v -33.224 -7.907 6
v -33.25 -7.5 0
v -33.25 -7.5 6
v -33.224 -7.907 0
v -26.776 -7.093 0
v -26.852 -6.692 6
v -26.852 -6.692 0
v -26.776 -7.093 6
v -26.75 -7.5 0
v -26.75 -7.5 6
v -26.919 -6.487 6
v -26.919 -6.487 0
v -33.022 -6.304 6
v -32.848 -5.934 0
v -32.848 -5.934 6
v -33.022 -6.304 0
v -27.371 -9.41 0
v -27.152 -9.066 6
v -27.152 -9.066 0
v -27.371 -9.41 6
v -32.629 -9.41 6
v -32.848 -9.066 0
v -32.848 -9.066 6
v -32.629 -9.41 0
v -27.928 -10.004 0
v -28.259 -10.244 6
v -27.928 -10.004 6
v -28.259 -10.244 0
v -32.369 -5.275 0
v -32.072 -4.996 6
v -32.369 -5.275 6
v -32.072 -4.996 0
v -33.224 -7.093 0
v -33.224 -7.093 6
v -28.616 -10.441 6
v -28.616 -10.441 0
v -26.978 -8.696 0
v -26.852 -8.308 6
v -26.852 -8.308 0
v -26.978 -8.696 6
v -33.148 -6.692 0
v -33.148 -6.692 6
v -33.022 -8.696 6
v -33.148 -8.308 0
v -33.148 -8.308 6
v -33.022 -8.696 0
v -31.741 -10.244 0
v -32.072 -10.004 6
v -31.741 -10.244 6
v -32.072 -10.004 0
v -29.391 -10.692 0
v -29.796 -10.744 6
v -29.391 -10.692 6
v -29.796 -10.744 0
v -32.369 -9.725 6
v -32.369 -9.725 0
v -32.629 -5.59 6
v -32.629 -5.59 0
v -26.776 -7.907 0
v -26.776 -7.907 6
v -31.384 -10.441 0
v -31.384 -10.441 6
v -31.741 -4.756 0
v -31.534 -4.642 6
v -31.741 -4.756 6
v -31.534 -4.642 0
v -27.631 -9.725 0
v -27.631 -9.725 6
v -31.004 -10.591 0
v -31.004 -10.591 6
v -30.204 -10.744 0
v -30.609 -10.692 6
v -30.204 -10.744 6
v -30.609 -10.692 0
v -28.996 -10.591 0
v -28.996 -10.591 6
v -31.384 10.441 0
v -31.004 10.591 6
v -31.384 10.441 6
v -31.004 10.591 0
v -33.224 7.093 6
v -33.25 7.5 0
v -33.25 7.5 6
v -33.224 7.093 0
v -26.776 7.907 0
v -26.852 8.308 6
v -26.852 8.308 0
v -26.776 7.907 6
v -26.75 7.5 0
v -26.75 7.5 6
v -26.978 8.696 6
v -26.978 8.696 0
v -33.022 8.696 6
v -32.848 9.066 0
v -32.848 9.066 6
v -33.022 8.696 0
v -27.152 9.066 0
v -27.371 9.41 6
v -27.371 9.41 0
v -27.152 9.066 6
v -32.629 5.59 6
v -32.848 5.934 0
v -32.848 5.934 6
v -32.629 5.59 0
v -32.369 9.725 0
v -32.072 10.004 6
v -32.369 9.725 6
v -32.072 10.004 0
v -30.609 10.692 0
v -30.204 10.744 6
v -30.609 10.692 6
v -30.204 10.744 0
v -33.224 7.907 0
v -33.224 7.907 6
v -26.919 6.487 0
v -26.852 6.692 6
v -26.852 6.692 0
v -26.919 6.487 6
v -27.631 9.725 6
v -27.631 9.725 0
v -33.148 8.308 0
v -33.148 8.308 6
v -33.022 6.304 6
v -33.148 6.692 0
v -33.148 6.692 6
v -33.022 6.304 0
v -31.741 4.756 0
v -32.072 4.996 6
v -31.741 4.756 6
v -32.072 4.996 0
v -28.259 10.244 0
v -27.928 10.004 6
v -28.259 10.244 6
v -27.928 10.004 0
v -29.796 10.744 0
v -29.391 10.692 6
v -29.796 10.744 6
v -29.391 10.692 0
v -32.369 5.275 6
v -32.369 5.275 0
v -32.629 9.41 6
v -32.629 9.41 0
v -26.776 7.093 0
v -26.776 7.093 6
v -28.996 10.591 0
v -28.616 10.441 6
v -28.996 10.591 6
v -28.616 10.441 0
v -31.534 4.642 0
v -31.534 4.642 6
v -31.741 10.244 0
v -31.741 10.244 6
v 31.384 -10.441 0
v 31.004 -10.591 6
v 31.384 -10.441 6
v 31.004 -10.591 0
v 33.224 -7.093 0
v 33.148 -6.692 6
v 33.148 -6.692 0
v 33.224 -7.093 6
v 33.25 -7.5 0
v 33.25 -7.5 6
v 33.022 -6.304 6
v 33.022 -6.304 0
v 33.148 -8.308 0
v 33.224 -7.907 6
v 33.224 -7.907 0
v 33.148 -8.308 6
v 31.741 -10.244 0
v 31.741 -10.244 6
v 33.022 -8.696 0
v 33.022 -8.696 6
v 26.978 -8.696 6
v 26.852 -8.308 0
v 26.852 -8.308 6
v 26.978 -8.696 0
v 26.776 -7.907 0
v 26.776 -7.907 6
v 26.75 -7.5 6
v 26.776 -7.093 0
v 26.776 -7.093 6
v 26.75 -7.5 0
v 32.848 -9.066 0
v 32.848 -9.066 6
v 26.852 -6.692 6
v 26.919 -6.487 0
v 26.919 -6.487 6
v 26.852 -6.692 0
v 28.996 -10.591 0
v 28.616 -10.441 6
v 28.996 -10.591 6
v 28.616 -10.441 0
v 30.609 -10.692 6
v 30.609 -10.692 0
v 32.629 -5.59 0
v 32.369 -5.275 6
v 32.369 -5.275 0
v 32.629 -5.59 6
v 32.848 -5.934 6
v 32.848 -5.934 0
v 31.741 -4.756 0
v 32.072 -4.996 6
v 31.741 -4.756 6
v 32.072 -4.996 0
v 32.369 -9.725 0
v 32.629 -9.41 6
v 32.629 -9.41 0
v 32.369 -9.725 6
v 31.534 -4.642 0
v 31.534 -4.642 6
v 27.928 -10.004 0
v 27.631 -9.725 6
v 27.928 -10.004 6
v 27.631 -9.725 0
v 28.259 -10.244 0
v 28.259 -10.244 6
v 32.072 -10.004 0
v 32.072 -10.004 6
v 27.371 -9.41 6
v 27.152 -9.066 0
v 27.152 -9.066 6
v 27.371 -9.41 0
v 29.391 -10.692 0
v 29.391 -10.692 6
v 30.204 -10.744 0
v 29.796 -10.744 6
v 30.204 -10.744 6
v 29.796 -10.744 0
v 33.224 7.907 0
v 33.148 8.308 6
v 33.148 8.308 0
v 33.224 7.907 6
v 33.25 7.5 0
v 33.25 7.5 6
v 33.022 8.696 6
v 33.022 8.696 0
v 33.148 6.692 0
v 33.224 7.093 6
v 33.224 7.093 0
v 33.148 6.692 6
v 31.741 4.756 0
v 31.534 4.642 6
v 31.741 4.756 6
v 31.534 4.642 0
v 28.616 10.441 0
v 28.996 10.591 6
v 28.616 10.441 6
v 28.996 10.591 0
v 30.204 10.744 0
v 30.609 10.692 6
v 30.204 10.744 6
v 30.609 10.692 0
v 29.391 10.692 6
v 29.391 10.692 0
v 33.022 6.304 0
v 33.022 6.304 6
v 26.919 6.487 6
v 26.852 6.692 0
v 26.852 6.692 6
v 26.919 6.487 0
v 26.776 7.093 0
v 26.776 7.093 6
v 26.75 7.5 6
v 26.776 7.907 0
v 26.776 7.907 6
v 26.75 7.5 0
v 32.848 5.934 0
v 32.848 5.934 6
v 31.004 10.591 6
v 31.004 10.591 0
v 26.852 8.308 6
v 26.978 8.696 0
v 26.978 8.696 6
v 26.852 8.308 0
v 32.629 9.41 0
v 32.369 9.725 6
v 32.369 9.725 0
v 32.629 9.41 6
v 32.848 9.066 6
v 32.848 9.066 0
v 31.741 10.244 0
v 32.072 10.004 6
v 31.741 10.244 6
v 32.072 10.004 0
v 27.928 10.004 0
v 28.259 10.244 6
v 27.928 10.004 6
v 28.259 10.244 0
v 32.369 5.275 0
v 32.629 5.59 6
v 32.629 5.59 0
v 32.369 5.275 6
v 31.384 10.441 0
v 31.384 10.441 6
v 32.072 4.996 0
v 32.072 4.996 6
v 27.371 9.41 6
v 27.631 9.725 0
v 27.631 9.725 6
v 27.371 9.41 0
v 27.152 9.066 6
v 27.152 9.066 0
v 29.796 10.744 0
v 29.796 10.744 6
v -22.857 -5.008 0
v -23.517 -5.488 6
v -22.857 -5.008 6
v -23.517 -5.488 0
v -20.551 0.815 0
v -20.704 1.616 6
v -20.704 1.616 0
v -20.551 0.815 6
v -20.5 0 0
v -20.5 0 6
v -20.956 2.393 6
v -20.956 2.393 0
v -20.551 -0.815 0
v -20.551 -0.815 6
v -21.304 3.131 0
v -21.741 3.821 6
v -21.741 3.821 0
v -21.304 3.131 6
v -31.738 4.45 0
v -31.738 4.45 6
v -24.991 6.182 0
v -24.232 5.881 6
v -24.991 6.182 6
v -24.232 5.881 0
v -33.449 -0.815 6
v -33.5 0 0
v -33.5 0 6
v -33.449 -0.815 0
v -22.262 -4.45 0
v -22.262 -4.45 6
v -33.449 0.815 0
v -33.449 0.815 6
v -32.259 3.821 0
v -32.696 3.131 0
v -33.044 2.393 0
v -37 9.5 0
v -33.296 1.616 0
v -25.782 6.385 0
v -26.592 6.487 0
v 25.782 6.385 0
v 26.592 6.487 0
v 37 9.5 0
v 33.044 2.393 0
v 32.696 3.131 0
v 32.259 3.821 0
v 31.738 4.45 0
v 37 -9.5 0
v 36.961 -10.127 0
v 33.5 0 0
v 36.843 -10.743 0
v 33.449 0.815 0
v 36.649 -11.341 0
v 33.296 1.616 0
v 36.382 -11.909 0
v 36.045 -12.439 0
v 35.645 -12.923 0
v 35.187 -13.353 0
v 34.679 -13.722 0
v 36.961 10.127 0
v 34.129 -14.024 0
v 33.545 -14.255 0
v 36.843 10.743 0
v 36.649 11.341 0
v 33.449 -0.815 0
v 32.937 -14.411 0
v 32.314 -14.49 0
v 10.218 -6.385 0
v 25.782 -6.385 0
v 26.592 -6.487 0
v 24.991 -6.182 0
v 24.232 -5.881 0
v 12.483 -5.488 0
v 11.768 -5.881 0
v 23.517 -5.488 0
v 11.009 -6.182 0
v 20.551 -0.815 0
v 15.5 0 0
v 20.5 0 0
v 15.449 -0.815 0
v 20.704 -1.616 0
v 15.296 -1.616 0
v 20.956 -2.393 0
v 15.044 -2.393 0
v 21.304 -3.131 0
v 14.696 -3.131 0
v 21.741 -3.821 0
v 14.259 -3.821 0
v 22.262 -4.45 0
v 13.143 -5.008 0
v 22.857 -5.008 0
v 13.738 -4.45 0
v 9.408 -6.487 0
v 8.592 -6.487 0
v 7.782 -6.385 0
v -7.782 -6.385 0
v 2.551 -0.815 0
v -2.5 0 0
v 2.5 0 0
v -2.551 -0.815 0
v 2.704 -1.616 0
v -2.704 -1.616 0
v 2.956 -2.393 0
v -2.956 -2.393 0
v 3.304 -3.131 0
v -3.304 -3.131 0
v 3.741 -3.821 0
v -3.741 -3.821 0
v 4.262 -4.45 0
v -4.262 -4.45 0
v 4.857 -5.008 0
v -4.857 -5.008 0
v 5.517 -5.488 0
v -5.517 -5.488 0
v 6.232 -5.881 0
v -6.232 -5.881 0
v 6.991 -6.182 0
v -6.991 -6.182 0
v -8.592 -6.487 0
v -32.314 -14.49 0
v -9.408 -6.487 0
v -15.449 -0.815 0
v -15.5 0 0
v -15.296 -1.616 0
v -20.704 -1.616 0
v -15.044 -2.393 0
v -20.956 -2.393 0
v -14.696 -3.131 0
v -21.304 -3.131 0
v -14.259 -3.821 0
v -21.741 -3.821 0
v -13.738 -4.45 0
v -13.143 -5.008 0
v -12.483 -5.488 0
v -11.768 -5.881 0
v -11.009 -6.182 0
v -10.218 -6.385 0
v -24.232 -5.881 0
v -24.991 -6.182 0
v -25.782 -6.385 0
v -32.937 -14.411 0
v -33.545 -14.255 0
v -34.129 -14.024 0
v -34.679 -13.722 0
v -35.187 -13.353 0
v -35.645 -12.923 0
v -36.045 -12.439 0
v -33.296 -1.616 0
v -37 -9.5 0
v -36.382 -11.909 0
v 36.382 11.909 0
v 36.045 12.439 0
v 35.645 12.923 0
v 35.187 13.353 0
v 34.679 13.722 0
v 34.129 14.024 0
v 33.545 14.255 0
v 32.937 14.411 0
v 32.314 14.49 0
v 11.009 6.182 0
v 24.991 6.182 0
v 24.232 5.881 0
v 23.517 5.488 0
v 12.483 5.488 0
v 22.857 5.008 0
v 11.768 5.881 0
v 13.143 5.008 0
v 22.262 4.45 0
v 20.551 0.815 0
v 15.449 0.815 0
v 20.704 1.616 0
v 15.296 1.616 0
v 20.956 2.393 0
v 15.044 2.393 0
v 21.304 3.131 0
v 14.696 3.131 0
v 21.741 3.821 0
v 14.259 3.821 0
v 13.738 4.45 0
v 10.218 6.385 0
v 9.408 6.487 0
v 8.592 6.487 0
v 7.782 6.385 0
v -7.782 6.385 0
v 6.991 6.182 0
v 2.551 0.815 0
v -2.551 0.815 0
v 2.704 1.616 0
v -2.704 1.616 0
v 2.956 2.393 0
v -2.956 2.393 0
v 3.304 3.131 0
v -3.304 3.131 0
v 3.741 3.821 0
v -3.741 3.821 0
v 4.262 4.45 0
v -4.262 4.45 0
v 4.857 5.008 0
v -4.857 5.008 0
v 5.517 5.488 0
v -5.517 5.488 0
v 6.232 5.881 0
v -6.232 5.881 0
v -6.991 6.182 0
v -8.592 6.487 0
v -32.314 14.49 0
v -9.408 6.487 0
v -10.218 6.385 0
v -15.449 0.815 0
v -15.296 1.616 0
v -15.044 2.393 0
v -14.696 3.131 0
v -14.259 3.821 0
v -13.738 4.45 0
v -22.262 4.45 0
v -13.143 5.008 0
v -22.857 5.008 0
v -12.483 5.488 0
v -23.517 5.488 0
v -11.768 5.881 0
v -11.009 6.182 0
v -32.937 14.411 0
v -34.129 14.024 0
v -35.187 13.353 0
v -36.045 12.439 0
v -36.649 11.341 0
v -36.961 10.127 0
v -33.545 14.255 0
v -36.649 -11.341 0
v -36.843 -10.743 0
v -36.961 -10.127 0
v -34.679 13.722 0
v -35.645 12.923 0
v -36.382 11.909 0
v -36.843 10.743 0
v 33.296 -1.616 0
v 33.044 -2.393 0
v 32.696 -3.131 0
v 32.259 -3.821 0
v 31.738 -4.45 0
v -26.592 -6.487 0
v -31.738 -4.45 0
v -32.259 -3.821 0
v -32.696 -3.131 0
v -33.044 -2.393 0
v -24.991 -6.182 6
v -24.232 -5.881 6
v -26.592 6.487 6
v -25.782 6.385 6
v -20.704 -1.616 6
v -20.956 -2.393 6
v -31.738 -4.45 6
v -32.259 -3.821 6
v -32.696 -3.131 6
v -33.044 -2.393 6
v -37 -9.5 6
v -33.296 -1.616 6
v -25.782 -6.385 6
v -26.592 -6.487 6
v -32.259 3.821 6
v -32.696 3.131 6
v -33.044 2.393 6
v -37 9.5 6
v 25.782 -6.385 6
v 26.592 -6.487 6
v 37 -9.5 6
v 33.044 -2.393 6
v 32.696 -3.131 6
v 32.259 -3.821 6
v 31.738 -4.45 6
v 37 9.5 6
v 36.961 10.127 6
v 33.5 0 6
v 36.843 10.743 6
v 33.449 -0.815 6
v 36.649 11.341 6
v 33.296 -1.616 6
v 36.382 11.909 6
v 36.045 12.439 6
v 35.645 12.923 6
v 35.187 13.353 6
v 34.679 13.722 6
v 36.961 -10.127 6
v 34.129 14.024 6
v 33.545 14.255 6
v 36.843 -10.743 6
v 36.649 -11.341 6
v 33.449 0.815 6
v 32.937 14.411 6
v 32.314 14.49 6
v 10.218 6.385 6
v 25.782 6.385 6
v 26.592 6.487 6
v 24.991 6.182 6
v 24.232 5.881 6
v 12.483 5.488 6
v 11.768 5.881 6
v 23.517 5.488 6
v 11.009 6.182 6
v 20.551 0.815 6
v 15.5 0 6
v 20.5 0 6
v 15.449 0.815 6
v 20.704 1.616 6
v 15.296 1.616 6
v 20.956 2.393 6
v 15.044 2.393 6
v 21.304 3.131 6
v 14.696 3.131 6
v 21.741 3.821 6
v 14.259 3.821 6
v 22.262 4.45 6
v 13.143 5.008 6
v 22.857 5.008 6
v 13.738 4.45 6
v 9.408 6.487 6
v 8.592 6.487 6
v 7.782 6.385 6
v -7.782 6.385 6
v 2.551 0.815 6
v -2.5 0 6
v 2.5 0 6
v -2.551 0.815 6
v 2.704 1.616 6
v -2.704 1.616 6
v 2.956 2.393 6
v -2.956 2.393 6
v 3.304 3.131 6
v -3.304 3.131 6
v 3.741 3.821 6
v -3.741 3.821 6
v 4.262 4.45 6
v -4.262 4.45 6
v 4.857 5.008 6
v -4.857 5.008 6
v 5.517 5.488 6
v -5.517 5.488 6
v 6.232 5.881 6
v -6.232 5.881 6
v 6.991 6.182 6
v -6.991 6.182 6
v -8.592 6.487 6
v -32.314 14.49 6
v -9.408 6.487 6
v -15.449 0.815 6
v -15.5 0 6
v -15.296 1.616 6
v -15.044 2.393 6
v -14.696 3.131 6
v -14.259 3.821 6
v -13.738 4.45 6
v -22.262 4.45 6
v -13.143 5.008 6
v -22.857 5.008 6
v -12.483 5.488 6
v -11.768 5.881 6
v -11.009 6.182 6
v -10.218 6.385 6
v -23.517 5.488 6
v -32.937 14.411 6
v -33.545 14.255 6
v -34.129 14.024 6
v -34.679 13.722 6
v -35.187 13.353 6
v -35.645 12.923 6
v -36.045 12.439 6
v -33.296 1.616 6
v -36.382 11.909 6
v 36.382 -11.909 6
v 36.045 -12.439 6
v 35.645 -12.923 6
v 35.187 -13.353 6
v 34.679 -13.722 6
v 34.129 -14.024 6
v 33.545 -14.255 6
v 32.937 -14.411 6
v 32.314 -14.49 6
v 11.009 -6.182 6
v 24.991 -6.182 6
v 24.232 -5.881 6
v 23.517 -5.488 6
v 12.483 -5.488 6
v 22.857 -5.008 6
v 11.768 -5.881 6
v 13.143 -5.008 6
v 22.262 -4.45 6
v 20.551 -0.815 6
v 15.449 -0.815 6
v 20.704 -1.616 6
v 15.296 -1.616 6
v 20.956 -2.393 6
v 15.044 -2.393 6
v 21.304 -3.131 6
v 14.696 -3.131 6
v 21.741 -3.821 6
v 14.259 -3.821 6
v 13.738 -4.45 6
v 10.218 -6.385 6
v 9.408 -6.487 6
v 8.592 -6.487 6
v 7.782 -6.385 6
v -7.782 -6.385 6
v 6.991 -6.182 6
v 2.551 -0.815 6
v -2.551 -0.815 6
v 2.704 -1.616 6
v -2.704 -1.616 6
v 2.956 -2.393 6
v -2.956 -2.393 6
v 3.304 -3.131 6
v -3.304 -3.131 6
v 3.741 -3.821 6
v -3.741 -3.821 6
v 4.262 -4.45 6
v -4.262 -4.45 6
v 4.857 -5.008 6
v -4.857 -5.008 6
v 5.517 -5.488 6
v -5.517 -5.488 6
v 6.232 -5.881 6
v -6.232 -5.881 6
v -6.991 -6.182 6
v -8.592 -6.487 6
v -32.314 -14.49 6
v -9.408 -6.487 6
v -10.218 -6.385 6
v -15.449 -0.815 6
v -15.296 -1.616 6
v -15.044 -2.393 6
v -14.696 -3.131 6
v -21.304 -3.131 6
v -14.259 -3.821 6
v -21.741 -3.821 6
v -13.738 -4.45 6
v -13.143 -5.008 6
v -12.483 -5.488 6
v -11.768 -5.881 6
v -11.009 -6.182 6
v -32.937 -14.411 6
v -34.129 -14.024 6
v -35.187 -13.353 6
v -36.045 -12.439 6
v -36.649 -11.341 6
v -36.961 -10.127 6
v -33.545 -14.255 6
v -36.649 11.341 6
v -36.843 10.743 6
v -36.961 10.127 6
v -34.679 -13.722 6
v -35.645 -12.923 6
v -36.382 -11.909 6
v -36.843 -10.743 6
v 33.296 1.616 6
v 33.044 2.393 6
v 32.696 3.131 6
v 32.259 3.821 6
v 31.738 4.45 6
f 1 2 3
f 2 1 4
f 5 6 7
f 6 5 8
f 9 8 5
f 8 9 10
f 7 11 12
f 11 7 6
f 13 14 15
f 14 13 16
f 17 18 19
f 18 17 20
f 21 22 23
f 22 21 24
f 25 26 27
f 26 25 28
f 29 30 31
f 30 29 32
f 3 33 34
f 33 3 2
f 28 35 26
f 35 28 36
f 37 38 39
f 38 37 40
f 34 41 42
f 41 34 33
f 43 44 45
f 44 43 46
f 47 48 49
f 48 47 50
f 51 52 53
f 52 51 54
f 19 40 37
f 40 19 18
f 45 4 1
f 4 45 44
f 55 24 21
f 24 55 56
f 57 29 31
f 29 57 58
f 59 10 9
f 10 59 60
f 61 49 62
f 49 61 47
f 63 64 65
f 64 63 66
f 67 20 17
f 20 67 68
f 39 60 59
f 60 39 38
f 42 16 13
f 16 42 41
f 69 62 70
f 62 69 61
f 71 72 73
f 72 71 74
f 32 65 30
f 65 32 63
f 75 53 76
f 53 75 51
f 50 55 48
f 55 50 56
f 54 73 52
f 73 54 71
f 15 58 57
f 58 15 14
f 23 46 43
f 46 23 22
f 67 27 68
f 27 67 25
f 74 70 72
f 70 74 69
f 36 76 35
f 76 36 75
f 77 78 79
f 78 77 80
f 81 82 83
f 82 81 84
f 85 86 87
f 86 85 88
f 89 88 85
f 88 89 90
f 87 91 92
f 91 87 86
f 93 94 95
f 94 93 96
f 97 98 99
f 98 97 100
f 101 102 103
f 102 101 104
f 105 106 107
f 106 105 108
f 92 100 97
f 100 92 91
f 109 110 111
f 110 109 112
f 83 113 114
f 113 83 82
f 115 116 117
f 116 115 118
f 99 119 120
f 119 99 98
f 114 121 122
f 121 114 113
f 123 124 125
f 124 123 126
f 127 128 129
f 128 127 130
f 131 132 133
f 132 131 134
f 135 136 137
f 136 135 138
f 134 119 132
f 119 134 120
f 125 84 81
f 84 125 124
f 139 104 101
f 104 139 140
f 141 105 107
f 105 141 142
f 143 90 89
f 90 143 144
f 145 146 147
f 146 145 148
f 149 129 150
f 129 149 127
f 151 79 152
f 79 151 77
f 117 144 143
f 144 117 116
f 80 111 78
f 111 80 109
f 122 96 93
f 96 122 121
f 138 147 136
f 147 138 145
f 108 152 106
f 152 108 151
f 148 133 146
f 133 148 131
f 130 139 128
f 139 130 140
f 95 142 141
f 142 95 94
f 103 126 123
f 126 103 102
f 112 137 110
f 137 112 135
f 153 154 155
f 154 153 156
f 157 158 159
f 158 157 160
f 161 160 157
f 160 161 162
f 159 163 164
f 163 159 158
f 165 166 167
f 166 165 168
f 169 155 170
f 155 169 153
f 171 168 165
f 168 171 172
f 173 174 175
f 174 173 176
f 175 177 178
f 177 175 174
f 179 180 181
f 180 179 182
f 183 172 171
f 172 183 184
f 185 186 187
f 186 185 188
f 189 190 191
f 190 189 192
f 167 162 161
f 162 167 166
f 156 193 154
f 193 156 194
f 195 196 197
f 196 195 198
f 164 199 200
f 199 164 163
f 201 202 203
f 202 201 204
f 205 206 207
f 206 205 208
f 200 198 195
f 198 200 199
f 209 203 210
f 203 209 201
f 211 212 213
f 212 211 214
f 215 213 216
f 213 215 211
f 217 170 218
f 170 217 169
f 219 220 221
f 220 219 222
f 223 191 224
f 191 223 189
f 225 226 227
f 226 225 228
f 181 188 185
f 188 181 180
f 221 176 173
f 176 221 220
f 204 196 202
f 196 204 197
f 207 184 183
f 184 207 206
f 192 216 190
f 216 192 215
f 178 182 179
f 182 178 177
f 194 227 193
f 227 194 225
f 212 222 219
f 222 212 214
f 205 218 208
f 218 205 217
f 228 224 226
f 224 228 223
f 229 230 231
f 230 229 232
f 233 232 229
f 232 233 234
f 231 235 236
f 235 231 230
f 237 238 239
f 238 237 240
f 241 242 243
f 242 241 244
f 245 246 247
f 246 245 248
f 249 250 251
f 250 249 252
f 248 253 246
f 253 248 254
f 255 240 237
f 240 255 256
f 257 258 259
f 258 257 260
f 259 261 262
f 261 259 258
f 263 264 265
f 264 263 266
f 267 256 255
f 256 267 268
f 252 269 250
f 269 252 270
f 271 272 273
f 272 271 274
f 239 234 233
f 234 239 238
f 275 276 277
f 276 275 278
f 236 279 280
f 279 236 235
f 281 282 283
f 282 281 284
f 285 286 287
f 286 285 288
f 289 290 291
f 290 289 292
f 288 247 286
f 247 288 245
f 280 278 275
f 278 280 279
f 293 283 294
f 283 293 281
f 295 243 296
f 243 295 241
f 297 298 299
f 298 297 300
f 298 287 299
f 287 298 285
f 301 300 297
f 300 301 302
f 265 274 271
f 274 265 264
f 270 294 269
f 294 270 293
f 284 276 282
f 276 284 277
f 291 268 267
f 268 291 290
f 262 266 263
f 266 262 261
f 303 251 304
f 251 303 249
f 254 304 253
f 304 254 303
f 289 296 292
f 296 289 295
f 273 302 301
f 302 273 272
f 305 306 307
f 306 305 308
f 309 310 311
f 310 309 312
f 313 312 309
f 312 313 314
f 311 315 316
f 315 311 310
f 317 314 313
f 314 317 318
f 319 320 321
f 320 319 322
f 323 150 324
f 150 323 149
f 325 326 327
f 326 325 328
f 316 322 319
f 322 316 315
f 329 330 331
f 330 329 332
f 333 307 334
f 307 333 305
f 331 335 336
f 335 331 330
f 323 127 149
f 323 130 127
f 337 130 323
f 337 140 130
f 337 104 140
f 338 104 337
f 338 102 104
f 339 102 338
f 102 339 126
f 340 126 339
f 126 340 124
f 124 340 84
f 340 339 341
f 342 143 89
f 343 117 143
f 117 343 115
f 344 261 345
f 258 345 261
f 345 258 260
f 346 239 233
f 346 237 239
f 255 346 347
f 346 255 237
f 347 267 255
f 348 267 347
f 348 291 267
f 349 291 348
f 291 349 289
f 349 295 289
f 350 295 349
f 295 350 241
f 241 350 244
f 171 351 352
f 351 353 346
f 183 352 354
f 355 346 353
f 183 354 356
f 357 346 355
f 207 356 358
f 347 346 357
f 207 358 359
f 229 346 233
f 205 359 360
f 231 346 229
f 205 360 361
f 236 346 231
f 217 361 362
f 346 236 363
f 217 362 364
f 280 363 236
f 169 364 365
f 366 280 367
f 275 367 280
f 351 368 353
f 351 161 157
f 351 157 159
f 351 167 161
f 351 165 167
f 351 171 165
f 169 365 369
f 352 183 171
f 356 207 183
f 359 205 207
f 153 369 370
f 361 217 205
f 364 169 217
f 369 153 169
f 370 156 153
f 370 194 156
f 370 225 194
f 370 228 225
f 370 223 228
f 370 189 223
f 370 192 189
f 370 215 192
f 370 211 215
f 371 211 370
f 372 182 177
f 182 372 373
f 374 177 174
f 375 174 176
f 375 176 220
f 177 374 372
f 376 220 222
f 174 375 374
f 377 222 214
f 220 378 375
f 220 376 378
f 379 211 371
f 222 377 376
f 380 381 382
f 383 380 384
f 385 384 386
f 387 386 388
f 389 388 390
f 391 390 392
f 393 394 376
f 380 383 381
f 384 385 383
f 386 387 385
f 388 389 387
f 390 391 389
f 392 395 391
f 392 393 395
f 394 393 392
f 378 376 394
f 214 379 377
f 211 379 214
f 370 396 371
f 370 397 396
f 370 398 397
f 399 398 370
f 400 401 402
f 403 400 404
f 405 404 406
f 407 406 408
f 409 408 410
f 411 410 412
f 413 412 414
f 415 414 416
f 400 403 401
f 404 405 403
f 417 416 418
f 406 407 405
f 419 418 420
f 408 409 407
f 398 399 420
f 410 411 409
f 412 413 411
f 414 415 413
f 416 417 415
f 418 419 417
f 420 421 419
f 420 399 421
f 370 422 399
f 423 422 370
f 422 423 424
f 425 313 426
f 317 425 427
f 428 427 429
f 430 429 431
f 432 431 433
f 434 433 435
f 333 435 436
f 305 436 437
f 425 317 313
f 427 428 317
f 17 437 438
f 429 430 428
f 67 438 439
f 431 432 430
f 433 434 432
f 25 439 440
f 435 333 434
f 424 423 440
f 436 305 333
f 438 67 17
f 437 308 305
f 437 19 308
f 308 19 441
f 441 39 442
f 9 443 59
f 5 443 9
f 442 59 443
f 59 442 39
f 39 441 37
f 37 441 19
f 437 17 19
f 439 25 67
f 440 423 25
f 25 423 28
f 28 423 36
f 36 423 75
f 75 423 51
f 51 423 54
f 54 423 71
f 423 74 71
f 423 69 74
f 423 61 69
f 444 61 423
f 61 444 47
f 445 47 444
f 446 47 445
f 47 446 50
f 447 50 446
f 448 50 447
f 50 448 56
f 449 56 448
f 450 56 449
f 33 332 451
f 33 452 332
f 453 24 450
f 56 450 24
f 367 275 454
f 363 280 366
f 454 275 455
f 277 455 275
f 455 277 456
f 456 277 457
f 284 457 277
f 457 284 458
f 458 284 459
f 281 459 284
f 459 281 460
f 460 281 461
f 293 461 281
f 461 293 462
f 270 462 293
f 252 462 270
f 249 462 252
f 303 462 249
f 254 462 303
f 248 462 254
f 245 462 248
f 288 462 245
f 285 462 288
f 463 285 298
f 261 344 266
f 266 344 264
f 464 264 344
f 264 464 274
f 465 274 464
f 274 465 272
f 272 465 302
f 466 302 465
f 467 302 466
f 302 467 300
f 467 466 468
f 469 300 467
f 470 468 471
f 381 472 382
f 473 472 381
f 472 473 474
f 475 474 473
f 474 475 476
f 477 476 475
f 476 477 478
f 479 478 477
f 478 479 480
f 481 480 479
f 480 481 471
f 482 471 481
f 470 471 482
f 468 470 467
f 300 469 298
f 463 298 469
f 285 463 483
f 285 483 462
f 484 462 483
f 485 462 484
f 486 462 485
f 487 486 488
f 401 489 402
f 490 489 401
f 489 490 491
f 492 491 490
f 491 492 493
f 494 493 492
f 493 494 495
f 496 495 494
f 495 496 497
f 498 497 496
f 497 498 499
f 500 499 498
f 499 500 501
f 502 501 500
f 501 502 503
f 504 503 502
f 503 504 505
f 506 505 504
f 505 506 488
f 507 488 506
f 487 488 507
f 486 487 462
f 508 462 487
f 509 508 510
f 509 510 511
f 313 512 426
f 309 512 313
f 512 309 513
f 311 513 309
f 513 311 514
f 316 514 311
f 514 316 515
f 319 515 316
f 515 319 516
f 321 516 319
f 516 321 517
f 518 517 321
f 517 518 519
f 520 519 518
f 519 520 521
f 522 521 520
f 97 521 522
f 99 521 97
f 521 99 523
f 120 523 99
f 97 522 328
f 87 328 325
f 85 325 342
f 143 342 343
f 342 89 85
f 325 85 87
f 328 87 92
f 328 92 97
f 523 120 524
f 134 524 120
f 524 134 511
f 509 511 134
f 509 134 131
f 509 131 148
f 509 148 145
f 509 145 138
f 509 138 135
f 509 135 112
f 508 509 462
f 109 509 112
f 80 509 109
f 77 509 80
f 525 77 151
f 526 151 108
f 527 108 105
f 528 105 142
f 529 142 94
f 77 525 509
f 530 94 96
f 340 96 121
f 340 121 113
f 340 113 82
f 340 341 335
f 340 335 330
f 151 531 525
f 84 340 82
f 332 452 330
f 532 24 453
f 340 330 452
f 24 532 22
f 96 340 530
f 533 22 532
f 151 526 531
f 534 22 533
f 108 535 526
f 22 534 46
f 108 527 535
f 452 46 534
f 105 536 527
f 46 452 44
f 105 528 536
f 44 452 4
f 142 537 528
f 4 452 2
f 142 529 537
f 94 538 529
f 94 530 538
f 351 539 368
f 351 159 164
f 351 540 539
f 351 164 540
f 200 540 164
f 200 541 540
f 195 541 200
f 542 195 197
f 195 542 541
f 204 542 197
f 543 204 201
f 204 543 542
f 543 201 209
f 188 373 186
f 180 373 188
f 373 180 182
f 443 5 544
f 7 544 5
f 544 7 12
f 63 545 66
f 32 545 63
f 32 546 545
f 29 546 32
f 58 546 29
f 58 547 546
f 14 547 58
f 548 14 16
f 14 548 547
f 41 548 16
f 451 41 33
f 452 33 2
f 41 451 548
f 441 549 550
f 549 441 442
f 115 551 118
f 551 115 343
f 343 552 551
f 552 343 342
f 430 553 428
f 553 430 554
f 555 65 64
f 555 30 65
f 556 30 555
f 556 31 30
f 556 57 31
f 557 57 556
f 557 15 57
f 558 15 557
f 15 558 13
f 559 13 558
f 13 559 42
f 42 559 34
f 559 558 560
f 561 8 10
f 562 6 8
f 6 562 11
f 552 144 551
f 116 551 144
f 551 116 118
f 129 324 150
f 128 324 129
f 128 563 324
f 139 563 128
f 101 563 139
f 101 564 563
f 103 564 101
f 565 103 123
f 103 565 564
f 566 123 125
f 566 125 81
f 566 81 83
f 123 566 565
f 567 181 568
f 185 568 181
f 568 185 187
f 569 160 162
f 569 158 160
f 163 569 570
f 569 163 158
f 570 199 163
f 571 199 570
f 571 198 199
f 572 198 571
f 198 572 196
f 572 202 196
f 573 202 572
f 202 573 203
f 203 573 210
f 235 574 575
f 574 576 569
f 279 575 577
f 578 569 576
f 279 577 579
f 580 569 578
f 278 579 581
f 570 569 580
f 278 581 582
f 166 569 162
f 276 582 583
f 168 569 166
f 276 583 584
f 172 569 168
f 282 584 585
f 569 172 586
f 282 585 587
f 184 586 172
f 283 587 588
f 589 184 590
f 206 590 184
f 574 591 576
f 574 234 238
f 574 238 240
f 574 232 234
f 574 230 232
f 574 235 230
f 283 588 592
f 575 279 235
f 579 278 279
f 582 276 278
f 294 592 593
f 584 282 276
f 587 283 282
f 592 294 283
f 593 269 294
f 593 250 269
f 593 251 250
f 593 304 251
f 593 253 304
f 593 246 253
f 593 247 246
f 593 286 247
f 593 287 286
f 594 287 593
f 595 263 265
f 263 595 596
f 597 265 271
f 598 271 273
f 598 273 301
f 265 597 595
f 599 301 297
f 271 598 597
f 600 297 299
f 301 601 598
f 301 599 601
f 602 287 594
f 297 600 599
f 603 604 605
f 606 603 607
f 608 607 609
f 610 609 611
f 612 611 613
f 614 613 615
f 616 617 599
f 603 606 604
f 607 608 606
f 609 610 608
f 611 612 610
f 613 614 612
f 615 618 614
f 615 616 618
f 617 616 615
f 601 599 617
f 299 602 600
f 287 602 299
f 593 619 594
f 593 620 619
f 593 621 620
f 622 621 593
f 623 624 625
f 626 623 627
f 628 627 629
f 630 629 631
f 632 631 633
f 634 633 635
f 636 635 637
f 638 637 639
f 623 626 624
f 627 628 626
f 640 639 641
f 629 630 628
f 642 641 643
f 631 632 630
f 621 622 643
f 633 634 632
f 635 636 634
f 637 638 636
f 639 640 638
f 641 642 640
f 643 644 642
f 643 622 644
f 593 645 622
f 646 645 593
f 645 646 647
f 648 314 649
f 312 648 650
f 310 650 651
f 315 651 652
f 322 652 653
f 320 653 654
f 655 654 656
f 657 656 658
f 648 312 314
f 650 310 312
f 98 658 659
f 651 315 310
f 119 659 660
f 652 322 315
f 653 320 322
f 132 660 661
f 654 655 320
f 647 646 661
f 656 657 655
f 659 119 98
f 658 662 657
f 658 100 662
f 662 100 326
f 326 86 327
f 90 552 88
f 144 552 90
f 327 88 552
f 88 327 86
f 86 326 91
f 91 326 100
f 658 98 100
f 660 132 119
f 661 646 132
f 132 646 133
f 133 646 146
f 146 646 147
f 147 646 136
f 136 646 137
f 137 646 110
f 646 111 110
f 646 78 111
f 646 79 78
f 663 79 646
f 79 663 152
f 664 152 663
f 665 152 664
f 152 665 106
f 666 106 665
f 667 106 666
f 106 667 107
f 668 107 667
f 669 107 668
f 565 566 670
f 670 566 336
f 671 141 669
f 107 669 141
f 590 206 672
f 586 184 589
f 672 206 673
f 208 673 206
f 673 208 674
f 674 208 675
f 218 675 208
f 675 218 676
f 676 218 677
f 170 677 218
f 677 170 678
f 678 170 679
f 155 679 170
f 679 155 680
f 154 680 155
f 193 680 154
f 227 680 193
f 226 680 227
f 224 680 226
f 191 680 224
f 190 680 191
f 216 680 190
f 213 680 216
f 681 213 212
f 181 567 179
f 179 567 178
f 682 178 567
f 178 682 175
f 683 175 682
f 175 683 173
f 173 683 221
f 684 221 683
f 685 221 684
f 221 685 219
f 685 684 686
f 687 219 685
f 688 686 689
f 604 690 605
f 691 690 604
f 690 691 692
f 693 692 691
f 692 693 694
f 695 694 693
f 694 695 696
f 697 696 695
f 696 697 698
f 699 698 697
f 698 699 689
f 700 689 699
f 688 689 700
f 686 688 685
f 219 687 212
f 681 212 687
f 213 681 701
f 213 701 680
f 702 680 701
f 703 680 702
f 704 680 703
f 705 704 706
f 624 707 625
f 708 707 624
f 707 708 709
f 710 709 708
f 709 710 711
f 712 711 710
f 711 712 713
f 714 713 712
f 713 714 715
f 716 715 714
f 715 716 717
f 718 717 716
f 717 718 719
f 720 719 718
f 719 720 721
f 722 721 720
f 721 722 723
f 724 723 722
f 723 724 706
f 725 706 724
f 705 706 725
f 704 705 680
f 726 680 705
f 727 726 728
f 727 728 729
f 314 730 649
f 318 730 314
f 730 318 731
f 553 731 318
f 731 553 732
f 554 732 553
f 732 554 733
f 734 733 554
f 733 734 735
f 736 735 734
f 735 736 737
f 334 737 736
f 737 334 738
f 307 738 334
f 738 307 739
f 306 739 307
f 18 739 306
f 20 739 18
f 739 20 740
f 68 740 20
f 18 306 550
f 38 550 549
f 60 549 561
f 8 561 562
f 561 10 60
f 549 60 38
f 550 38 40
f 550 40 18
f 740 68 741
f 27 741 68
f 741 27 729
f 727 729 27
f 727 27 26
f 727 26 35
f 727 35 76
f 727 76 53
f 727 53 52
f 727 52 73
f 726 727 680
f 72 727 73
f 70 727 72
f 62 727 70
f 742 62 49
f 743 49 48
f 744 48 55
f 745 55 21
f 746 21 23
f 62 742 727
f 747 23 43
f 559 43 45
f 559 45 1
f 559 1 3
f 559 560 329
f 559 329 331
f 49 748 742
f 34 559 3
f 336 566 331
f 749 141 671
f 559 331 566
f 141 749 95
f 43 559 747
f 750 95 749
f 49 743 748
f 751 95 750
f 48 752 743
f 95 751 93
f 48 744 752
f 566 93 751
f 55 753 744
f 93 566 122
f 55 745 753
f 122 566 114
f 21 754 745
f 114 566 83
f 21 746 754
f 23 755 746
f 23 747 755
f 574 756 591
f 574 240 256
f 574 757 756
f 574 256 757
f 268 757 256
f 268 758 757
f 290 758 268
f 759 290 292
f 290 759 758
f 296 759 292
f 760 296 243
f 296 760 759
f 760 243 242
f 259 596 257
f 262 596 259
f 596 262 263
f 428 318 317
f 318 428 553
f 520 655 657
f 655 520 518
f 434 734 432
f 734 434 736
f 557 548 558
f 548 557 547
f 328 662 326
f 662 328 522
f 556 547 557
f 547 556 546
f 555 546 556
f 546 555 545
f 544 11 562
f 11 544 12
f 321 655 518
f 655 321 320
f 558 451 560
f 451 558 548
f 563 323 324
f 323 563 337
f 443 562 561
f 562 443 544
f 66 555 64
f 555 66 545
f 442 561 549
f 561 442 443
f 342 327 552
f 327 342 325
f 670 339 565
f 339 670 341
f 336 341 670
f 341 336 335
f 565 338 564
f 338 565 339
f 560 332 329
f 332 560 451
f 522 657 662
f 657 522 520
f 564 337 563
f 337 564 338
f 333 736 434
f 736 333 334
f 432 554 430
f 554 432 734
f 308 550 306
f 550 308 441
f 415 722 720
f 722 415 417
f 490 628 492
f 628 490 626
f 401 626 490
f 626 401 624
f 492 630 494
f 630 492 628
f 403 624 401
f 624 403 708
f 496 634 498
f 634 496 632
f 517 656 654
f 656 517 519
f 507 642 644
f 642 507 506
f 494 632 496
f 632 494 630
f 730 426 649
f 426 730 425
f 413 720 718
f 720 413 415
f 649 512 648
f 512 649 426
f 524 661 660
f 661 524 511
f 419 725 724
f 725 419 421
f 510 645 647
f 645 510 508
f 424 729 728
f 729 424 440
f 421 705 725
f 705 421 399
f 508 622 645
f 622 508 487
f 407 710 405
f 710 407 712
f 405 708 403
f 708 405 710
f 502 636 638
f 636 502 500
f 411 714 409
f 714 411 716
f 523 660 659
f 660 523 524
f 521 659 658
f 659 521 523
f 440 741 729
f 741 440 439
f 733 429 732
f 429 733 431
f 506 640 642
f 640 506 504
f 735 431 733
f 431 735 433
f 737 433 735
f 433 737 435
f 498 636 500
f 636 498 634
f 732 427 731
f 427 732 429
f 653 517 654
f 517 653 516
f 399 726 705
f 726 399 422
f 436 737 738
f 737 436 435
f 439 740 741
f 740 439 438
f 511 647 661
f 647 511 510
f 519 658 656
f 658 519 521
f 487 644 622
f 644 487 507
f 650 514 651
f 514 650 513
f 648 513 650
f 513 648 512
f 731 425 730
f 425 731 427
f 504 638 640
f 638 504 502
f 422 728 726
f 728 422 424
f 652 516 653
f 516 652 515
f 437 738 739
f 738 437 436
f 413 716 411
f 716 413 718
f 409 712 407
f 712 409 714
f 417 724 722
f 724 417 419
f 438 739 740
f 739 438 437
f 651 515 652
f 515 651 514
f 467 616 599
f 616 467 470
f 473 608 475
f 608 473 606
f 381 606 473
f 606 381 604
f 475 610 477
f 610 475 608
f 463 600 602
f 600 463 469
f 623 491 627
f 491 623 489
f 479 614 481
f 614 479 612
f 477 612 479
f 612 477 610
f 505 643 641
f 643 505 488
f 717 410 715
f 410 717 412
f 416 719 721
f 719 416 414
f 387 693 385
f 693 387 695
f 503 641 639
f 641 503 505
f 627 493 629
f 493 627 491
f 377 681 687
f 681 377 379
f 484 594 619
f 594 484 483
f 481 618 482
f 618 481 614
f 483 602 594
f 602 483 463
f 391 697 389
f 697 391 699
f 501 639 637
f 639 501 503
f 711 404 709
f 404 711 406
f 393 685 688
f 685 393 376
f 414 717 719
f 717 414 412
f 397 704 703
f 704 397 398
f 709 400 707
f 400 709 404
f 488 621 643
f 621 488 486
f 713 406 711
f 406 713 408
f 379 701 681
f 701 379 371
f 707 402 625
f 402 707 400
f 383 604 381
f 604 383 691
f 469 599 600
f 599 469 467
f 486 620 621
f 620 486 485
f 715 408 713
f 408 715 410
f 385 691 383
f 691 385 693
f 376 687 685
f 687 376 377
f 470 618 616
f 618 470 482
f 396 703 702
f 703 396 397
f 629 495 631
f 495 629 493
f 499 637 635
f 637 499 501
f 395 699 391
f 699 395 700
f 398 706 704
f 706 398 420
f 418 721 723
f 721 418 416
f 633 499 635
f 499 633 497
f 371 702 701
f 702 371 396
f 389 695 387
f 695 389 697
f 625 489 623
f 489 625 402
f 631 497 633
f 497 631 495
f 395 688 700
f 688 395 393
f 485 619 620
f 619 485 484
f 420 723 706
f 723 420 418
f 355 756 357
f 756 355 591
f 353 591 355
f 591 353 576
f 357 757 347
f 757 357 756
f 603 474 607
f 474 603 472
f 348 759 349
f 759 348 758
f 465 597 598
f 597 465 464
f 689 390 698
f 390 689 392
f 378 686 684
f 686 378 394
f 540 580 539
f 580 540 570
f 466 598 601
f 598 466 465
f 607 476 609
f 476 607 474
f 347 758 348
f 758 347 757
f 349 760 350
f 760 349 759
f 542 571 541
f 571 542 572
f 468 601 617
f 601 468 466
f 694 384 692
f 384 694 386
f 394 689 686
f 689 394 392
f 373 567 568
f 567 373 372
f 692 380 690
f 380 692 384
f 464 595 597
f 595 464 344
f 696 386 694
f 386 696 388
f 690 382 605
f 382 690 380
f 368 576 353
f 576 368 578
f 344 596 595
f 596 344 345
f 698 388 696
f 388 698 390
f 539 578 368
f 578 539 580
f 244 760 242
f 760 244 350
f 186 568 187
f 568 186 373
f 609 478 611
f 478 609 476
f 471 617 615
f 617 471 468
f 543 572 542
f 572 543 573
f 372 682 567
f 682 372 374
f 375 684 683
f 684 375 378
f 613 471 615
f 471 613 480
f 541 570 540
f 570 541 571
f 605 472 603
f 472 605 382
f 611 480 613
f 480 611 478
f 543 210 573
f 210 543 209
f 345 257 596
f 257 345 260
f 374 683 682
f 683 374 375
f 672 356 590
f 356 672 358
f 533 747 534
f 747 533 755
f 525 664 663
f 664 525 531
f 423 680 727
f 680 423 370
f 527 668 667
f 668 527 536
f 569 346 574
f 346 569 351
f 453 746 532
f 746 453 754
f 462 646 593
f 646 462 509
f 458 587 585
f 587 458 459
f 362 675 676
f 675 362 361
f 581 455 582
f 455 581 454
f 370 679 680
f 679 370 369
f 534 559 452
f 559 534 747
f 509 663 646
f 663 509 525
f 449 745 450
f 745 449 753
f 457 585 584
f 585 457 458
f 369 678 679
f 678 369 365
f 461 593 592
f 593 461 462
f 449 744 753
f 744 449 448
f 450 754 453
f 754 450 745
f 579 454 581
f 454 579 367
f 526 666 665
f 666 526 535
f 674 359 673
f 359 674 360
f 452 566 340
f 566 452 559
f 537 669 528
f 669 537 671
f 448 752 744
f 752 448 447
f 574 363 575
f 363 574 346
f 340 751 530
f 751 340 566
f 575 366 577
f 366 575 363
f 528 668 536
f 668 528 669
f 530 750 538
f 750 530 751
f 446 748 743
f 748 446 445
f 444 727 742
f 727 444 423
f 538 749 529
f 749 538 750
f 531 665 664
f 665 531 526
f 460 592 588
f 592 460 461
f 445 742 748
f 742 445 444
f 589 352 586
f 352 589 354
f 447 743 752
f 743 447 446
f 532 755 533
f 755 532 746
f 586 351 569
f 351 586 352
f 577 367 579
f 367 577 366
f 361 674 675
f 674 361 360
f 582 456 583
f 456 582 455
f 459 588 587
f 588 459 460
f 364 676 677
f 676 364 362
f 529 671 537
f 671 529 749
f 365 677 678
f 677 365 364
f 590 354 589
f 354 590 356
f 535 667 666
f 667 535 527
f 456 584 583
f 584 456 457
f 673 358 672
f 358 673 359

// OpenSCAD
$fn = 50;


difference() {
	union() {
		hull() {
			translate(v = [-32.0000000000, 9.5000000000, 0]) {
				cylinder(h = 6, r = 5);
			}
			translate(v = [32.0000000000, 9.5000000000, 0]) {
				cylinder(h = 6, r = 5);
			}
			translate(v = [-32.0000000000, -9.5000000000, 0]) {
				cylinder(h = 6, r = 5);
			}
			translate(v = [32.0000000000, -9.5000000000, 0]) {
				cylinder(h = 6, r = 5);
			}
		}
	}
	union() {
		#translate(v = [-30.0000000000, -7.5000000000, -100.0000000000]) {
			cylinder(h = 200, r = 3.2500000000);
		}
		#translate(v = [-30.0000000000, 7.5000000000, -100.0000000000]) {
			cylinder(h = 200, r = 3.2500000000);
		}
		#translate(v = [30.0000000000, -7.5000000000, -100.0000000000]) {
			cylinder(h = 200, r = 3.2500000000);
		}
		#translate(v = [30.0000000000, 7.5000000000, -100.0000000000]) {
			cylinder(h = 200, r = 3.2500000000);
		}
		#translate(v = [-27.0000000000, 0, 0]) {
			cylinder(h = 6, r = 6.5000000000);
		}
		#translate(v = [-9.0000000000, 0, 0]) {
			cylinder(h = 6, r = 6.5000000000);
		}
		#translate(v = [9.0000000000, 0, 0]) {
			cylinder(h = 6, r = 6.5000000000);
		}
		#translate(v = [27.0000000000, 0, 0]) {
			cylinder(h = 6, r = 6.5000000000);
		}
	}
}
